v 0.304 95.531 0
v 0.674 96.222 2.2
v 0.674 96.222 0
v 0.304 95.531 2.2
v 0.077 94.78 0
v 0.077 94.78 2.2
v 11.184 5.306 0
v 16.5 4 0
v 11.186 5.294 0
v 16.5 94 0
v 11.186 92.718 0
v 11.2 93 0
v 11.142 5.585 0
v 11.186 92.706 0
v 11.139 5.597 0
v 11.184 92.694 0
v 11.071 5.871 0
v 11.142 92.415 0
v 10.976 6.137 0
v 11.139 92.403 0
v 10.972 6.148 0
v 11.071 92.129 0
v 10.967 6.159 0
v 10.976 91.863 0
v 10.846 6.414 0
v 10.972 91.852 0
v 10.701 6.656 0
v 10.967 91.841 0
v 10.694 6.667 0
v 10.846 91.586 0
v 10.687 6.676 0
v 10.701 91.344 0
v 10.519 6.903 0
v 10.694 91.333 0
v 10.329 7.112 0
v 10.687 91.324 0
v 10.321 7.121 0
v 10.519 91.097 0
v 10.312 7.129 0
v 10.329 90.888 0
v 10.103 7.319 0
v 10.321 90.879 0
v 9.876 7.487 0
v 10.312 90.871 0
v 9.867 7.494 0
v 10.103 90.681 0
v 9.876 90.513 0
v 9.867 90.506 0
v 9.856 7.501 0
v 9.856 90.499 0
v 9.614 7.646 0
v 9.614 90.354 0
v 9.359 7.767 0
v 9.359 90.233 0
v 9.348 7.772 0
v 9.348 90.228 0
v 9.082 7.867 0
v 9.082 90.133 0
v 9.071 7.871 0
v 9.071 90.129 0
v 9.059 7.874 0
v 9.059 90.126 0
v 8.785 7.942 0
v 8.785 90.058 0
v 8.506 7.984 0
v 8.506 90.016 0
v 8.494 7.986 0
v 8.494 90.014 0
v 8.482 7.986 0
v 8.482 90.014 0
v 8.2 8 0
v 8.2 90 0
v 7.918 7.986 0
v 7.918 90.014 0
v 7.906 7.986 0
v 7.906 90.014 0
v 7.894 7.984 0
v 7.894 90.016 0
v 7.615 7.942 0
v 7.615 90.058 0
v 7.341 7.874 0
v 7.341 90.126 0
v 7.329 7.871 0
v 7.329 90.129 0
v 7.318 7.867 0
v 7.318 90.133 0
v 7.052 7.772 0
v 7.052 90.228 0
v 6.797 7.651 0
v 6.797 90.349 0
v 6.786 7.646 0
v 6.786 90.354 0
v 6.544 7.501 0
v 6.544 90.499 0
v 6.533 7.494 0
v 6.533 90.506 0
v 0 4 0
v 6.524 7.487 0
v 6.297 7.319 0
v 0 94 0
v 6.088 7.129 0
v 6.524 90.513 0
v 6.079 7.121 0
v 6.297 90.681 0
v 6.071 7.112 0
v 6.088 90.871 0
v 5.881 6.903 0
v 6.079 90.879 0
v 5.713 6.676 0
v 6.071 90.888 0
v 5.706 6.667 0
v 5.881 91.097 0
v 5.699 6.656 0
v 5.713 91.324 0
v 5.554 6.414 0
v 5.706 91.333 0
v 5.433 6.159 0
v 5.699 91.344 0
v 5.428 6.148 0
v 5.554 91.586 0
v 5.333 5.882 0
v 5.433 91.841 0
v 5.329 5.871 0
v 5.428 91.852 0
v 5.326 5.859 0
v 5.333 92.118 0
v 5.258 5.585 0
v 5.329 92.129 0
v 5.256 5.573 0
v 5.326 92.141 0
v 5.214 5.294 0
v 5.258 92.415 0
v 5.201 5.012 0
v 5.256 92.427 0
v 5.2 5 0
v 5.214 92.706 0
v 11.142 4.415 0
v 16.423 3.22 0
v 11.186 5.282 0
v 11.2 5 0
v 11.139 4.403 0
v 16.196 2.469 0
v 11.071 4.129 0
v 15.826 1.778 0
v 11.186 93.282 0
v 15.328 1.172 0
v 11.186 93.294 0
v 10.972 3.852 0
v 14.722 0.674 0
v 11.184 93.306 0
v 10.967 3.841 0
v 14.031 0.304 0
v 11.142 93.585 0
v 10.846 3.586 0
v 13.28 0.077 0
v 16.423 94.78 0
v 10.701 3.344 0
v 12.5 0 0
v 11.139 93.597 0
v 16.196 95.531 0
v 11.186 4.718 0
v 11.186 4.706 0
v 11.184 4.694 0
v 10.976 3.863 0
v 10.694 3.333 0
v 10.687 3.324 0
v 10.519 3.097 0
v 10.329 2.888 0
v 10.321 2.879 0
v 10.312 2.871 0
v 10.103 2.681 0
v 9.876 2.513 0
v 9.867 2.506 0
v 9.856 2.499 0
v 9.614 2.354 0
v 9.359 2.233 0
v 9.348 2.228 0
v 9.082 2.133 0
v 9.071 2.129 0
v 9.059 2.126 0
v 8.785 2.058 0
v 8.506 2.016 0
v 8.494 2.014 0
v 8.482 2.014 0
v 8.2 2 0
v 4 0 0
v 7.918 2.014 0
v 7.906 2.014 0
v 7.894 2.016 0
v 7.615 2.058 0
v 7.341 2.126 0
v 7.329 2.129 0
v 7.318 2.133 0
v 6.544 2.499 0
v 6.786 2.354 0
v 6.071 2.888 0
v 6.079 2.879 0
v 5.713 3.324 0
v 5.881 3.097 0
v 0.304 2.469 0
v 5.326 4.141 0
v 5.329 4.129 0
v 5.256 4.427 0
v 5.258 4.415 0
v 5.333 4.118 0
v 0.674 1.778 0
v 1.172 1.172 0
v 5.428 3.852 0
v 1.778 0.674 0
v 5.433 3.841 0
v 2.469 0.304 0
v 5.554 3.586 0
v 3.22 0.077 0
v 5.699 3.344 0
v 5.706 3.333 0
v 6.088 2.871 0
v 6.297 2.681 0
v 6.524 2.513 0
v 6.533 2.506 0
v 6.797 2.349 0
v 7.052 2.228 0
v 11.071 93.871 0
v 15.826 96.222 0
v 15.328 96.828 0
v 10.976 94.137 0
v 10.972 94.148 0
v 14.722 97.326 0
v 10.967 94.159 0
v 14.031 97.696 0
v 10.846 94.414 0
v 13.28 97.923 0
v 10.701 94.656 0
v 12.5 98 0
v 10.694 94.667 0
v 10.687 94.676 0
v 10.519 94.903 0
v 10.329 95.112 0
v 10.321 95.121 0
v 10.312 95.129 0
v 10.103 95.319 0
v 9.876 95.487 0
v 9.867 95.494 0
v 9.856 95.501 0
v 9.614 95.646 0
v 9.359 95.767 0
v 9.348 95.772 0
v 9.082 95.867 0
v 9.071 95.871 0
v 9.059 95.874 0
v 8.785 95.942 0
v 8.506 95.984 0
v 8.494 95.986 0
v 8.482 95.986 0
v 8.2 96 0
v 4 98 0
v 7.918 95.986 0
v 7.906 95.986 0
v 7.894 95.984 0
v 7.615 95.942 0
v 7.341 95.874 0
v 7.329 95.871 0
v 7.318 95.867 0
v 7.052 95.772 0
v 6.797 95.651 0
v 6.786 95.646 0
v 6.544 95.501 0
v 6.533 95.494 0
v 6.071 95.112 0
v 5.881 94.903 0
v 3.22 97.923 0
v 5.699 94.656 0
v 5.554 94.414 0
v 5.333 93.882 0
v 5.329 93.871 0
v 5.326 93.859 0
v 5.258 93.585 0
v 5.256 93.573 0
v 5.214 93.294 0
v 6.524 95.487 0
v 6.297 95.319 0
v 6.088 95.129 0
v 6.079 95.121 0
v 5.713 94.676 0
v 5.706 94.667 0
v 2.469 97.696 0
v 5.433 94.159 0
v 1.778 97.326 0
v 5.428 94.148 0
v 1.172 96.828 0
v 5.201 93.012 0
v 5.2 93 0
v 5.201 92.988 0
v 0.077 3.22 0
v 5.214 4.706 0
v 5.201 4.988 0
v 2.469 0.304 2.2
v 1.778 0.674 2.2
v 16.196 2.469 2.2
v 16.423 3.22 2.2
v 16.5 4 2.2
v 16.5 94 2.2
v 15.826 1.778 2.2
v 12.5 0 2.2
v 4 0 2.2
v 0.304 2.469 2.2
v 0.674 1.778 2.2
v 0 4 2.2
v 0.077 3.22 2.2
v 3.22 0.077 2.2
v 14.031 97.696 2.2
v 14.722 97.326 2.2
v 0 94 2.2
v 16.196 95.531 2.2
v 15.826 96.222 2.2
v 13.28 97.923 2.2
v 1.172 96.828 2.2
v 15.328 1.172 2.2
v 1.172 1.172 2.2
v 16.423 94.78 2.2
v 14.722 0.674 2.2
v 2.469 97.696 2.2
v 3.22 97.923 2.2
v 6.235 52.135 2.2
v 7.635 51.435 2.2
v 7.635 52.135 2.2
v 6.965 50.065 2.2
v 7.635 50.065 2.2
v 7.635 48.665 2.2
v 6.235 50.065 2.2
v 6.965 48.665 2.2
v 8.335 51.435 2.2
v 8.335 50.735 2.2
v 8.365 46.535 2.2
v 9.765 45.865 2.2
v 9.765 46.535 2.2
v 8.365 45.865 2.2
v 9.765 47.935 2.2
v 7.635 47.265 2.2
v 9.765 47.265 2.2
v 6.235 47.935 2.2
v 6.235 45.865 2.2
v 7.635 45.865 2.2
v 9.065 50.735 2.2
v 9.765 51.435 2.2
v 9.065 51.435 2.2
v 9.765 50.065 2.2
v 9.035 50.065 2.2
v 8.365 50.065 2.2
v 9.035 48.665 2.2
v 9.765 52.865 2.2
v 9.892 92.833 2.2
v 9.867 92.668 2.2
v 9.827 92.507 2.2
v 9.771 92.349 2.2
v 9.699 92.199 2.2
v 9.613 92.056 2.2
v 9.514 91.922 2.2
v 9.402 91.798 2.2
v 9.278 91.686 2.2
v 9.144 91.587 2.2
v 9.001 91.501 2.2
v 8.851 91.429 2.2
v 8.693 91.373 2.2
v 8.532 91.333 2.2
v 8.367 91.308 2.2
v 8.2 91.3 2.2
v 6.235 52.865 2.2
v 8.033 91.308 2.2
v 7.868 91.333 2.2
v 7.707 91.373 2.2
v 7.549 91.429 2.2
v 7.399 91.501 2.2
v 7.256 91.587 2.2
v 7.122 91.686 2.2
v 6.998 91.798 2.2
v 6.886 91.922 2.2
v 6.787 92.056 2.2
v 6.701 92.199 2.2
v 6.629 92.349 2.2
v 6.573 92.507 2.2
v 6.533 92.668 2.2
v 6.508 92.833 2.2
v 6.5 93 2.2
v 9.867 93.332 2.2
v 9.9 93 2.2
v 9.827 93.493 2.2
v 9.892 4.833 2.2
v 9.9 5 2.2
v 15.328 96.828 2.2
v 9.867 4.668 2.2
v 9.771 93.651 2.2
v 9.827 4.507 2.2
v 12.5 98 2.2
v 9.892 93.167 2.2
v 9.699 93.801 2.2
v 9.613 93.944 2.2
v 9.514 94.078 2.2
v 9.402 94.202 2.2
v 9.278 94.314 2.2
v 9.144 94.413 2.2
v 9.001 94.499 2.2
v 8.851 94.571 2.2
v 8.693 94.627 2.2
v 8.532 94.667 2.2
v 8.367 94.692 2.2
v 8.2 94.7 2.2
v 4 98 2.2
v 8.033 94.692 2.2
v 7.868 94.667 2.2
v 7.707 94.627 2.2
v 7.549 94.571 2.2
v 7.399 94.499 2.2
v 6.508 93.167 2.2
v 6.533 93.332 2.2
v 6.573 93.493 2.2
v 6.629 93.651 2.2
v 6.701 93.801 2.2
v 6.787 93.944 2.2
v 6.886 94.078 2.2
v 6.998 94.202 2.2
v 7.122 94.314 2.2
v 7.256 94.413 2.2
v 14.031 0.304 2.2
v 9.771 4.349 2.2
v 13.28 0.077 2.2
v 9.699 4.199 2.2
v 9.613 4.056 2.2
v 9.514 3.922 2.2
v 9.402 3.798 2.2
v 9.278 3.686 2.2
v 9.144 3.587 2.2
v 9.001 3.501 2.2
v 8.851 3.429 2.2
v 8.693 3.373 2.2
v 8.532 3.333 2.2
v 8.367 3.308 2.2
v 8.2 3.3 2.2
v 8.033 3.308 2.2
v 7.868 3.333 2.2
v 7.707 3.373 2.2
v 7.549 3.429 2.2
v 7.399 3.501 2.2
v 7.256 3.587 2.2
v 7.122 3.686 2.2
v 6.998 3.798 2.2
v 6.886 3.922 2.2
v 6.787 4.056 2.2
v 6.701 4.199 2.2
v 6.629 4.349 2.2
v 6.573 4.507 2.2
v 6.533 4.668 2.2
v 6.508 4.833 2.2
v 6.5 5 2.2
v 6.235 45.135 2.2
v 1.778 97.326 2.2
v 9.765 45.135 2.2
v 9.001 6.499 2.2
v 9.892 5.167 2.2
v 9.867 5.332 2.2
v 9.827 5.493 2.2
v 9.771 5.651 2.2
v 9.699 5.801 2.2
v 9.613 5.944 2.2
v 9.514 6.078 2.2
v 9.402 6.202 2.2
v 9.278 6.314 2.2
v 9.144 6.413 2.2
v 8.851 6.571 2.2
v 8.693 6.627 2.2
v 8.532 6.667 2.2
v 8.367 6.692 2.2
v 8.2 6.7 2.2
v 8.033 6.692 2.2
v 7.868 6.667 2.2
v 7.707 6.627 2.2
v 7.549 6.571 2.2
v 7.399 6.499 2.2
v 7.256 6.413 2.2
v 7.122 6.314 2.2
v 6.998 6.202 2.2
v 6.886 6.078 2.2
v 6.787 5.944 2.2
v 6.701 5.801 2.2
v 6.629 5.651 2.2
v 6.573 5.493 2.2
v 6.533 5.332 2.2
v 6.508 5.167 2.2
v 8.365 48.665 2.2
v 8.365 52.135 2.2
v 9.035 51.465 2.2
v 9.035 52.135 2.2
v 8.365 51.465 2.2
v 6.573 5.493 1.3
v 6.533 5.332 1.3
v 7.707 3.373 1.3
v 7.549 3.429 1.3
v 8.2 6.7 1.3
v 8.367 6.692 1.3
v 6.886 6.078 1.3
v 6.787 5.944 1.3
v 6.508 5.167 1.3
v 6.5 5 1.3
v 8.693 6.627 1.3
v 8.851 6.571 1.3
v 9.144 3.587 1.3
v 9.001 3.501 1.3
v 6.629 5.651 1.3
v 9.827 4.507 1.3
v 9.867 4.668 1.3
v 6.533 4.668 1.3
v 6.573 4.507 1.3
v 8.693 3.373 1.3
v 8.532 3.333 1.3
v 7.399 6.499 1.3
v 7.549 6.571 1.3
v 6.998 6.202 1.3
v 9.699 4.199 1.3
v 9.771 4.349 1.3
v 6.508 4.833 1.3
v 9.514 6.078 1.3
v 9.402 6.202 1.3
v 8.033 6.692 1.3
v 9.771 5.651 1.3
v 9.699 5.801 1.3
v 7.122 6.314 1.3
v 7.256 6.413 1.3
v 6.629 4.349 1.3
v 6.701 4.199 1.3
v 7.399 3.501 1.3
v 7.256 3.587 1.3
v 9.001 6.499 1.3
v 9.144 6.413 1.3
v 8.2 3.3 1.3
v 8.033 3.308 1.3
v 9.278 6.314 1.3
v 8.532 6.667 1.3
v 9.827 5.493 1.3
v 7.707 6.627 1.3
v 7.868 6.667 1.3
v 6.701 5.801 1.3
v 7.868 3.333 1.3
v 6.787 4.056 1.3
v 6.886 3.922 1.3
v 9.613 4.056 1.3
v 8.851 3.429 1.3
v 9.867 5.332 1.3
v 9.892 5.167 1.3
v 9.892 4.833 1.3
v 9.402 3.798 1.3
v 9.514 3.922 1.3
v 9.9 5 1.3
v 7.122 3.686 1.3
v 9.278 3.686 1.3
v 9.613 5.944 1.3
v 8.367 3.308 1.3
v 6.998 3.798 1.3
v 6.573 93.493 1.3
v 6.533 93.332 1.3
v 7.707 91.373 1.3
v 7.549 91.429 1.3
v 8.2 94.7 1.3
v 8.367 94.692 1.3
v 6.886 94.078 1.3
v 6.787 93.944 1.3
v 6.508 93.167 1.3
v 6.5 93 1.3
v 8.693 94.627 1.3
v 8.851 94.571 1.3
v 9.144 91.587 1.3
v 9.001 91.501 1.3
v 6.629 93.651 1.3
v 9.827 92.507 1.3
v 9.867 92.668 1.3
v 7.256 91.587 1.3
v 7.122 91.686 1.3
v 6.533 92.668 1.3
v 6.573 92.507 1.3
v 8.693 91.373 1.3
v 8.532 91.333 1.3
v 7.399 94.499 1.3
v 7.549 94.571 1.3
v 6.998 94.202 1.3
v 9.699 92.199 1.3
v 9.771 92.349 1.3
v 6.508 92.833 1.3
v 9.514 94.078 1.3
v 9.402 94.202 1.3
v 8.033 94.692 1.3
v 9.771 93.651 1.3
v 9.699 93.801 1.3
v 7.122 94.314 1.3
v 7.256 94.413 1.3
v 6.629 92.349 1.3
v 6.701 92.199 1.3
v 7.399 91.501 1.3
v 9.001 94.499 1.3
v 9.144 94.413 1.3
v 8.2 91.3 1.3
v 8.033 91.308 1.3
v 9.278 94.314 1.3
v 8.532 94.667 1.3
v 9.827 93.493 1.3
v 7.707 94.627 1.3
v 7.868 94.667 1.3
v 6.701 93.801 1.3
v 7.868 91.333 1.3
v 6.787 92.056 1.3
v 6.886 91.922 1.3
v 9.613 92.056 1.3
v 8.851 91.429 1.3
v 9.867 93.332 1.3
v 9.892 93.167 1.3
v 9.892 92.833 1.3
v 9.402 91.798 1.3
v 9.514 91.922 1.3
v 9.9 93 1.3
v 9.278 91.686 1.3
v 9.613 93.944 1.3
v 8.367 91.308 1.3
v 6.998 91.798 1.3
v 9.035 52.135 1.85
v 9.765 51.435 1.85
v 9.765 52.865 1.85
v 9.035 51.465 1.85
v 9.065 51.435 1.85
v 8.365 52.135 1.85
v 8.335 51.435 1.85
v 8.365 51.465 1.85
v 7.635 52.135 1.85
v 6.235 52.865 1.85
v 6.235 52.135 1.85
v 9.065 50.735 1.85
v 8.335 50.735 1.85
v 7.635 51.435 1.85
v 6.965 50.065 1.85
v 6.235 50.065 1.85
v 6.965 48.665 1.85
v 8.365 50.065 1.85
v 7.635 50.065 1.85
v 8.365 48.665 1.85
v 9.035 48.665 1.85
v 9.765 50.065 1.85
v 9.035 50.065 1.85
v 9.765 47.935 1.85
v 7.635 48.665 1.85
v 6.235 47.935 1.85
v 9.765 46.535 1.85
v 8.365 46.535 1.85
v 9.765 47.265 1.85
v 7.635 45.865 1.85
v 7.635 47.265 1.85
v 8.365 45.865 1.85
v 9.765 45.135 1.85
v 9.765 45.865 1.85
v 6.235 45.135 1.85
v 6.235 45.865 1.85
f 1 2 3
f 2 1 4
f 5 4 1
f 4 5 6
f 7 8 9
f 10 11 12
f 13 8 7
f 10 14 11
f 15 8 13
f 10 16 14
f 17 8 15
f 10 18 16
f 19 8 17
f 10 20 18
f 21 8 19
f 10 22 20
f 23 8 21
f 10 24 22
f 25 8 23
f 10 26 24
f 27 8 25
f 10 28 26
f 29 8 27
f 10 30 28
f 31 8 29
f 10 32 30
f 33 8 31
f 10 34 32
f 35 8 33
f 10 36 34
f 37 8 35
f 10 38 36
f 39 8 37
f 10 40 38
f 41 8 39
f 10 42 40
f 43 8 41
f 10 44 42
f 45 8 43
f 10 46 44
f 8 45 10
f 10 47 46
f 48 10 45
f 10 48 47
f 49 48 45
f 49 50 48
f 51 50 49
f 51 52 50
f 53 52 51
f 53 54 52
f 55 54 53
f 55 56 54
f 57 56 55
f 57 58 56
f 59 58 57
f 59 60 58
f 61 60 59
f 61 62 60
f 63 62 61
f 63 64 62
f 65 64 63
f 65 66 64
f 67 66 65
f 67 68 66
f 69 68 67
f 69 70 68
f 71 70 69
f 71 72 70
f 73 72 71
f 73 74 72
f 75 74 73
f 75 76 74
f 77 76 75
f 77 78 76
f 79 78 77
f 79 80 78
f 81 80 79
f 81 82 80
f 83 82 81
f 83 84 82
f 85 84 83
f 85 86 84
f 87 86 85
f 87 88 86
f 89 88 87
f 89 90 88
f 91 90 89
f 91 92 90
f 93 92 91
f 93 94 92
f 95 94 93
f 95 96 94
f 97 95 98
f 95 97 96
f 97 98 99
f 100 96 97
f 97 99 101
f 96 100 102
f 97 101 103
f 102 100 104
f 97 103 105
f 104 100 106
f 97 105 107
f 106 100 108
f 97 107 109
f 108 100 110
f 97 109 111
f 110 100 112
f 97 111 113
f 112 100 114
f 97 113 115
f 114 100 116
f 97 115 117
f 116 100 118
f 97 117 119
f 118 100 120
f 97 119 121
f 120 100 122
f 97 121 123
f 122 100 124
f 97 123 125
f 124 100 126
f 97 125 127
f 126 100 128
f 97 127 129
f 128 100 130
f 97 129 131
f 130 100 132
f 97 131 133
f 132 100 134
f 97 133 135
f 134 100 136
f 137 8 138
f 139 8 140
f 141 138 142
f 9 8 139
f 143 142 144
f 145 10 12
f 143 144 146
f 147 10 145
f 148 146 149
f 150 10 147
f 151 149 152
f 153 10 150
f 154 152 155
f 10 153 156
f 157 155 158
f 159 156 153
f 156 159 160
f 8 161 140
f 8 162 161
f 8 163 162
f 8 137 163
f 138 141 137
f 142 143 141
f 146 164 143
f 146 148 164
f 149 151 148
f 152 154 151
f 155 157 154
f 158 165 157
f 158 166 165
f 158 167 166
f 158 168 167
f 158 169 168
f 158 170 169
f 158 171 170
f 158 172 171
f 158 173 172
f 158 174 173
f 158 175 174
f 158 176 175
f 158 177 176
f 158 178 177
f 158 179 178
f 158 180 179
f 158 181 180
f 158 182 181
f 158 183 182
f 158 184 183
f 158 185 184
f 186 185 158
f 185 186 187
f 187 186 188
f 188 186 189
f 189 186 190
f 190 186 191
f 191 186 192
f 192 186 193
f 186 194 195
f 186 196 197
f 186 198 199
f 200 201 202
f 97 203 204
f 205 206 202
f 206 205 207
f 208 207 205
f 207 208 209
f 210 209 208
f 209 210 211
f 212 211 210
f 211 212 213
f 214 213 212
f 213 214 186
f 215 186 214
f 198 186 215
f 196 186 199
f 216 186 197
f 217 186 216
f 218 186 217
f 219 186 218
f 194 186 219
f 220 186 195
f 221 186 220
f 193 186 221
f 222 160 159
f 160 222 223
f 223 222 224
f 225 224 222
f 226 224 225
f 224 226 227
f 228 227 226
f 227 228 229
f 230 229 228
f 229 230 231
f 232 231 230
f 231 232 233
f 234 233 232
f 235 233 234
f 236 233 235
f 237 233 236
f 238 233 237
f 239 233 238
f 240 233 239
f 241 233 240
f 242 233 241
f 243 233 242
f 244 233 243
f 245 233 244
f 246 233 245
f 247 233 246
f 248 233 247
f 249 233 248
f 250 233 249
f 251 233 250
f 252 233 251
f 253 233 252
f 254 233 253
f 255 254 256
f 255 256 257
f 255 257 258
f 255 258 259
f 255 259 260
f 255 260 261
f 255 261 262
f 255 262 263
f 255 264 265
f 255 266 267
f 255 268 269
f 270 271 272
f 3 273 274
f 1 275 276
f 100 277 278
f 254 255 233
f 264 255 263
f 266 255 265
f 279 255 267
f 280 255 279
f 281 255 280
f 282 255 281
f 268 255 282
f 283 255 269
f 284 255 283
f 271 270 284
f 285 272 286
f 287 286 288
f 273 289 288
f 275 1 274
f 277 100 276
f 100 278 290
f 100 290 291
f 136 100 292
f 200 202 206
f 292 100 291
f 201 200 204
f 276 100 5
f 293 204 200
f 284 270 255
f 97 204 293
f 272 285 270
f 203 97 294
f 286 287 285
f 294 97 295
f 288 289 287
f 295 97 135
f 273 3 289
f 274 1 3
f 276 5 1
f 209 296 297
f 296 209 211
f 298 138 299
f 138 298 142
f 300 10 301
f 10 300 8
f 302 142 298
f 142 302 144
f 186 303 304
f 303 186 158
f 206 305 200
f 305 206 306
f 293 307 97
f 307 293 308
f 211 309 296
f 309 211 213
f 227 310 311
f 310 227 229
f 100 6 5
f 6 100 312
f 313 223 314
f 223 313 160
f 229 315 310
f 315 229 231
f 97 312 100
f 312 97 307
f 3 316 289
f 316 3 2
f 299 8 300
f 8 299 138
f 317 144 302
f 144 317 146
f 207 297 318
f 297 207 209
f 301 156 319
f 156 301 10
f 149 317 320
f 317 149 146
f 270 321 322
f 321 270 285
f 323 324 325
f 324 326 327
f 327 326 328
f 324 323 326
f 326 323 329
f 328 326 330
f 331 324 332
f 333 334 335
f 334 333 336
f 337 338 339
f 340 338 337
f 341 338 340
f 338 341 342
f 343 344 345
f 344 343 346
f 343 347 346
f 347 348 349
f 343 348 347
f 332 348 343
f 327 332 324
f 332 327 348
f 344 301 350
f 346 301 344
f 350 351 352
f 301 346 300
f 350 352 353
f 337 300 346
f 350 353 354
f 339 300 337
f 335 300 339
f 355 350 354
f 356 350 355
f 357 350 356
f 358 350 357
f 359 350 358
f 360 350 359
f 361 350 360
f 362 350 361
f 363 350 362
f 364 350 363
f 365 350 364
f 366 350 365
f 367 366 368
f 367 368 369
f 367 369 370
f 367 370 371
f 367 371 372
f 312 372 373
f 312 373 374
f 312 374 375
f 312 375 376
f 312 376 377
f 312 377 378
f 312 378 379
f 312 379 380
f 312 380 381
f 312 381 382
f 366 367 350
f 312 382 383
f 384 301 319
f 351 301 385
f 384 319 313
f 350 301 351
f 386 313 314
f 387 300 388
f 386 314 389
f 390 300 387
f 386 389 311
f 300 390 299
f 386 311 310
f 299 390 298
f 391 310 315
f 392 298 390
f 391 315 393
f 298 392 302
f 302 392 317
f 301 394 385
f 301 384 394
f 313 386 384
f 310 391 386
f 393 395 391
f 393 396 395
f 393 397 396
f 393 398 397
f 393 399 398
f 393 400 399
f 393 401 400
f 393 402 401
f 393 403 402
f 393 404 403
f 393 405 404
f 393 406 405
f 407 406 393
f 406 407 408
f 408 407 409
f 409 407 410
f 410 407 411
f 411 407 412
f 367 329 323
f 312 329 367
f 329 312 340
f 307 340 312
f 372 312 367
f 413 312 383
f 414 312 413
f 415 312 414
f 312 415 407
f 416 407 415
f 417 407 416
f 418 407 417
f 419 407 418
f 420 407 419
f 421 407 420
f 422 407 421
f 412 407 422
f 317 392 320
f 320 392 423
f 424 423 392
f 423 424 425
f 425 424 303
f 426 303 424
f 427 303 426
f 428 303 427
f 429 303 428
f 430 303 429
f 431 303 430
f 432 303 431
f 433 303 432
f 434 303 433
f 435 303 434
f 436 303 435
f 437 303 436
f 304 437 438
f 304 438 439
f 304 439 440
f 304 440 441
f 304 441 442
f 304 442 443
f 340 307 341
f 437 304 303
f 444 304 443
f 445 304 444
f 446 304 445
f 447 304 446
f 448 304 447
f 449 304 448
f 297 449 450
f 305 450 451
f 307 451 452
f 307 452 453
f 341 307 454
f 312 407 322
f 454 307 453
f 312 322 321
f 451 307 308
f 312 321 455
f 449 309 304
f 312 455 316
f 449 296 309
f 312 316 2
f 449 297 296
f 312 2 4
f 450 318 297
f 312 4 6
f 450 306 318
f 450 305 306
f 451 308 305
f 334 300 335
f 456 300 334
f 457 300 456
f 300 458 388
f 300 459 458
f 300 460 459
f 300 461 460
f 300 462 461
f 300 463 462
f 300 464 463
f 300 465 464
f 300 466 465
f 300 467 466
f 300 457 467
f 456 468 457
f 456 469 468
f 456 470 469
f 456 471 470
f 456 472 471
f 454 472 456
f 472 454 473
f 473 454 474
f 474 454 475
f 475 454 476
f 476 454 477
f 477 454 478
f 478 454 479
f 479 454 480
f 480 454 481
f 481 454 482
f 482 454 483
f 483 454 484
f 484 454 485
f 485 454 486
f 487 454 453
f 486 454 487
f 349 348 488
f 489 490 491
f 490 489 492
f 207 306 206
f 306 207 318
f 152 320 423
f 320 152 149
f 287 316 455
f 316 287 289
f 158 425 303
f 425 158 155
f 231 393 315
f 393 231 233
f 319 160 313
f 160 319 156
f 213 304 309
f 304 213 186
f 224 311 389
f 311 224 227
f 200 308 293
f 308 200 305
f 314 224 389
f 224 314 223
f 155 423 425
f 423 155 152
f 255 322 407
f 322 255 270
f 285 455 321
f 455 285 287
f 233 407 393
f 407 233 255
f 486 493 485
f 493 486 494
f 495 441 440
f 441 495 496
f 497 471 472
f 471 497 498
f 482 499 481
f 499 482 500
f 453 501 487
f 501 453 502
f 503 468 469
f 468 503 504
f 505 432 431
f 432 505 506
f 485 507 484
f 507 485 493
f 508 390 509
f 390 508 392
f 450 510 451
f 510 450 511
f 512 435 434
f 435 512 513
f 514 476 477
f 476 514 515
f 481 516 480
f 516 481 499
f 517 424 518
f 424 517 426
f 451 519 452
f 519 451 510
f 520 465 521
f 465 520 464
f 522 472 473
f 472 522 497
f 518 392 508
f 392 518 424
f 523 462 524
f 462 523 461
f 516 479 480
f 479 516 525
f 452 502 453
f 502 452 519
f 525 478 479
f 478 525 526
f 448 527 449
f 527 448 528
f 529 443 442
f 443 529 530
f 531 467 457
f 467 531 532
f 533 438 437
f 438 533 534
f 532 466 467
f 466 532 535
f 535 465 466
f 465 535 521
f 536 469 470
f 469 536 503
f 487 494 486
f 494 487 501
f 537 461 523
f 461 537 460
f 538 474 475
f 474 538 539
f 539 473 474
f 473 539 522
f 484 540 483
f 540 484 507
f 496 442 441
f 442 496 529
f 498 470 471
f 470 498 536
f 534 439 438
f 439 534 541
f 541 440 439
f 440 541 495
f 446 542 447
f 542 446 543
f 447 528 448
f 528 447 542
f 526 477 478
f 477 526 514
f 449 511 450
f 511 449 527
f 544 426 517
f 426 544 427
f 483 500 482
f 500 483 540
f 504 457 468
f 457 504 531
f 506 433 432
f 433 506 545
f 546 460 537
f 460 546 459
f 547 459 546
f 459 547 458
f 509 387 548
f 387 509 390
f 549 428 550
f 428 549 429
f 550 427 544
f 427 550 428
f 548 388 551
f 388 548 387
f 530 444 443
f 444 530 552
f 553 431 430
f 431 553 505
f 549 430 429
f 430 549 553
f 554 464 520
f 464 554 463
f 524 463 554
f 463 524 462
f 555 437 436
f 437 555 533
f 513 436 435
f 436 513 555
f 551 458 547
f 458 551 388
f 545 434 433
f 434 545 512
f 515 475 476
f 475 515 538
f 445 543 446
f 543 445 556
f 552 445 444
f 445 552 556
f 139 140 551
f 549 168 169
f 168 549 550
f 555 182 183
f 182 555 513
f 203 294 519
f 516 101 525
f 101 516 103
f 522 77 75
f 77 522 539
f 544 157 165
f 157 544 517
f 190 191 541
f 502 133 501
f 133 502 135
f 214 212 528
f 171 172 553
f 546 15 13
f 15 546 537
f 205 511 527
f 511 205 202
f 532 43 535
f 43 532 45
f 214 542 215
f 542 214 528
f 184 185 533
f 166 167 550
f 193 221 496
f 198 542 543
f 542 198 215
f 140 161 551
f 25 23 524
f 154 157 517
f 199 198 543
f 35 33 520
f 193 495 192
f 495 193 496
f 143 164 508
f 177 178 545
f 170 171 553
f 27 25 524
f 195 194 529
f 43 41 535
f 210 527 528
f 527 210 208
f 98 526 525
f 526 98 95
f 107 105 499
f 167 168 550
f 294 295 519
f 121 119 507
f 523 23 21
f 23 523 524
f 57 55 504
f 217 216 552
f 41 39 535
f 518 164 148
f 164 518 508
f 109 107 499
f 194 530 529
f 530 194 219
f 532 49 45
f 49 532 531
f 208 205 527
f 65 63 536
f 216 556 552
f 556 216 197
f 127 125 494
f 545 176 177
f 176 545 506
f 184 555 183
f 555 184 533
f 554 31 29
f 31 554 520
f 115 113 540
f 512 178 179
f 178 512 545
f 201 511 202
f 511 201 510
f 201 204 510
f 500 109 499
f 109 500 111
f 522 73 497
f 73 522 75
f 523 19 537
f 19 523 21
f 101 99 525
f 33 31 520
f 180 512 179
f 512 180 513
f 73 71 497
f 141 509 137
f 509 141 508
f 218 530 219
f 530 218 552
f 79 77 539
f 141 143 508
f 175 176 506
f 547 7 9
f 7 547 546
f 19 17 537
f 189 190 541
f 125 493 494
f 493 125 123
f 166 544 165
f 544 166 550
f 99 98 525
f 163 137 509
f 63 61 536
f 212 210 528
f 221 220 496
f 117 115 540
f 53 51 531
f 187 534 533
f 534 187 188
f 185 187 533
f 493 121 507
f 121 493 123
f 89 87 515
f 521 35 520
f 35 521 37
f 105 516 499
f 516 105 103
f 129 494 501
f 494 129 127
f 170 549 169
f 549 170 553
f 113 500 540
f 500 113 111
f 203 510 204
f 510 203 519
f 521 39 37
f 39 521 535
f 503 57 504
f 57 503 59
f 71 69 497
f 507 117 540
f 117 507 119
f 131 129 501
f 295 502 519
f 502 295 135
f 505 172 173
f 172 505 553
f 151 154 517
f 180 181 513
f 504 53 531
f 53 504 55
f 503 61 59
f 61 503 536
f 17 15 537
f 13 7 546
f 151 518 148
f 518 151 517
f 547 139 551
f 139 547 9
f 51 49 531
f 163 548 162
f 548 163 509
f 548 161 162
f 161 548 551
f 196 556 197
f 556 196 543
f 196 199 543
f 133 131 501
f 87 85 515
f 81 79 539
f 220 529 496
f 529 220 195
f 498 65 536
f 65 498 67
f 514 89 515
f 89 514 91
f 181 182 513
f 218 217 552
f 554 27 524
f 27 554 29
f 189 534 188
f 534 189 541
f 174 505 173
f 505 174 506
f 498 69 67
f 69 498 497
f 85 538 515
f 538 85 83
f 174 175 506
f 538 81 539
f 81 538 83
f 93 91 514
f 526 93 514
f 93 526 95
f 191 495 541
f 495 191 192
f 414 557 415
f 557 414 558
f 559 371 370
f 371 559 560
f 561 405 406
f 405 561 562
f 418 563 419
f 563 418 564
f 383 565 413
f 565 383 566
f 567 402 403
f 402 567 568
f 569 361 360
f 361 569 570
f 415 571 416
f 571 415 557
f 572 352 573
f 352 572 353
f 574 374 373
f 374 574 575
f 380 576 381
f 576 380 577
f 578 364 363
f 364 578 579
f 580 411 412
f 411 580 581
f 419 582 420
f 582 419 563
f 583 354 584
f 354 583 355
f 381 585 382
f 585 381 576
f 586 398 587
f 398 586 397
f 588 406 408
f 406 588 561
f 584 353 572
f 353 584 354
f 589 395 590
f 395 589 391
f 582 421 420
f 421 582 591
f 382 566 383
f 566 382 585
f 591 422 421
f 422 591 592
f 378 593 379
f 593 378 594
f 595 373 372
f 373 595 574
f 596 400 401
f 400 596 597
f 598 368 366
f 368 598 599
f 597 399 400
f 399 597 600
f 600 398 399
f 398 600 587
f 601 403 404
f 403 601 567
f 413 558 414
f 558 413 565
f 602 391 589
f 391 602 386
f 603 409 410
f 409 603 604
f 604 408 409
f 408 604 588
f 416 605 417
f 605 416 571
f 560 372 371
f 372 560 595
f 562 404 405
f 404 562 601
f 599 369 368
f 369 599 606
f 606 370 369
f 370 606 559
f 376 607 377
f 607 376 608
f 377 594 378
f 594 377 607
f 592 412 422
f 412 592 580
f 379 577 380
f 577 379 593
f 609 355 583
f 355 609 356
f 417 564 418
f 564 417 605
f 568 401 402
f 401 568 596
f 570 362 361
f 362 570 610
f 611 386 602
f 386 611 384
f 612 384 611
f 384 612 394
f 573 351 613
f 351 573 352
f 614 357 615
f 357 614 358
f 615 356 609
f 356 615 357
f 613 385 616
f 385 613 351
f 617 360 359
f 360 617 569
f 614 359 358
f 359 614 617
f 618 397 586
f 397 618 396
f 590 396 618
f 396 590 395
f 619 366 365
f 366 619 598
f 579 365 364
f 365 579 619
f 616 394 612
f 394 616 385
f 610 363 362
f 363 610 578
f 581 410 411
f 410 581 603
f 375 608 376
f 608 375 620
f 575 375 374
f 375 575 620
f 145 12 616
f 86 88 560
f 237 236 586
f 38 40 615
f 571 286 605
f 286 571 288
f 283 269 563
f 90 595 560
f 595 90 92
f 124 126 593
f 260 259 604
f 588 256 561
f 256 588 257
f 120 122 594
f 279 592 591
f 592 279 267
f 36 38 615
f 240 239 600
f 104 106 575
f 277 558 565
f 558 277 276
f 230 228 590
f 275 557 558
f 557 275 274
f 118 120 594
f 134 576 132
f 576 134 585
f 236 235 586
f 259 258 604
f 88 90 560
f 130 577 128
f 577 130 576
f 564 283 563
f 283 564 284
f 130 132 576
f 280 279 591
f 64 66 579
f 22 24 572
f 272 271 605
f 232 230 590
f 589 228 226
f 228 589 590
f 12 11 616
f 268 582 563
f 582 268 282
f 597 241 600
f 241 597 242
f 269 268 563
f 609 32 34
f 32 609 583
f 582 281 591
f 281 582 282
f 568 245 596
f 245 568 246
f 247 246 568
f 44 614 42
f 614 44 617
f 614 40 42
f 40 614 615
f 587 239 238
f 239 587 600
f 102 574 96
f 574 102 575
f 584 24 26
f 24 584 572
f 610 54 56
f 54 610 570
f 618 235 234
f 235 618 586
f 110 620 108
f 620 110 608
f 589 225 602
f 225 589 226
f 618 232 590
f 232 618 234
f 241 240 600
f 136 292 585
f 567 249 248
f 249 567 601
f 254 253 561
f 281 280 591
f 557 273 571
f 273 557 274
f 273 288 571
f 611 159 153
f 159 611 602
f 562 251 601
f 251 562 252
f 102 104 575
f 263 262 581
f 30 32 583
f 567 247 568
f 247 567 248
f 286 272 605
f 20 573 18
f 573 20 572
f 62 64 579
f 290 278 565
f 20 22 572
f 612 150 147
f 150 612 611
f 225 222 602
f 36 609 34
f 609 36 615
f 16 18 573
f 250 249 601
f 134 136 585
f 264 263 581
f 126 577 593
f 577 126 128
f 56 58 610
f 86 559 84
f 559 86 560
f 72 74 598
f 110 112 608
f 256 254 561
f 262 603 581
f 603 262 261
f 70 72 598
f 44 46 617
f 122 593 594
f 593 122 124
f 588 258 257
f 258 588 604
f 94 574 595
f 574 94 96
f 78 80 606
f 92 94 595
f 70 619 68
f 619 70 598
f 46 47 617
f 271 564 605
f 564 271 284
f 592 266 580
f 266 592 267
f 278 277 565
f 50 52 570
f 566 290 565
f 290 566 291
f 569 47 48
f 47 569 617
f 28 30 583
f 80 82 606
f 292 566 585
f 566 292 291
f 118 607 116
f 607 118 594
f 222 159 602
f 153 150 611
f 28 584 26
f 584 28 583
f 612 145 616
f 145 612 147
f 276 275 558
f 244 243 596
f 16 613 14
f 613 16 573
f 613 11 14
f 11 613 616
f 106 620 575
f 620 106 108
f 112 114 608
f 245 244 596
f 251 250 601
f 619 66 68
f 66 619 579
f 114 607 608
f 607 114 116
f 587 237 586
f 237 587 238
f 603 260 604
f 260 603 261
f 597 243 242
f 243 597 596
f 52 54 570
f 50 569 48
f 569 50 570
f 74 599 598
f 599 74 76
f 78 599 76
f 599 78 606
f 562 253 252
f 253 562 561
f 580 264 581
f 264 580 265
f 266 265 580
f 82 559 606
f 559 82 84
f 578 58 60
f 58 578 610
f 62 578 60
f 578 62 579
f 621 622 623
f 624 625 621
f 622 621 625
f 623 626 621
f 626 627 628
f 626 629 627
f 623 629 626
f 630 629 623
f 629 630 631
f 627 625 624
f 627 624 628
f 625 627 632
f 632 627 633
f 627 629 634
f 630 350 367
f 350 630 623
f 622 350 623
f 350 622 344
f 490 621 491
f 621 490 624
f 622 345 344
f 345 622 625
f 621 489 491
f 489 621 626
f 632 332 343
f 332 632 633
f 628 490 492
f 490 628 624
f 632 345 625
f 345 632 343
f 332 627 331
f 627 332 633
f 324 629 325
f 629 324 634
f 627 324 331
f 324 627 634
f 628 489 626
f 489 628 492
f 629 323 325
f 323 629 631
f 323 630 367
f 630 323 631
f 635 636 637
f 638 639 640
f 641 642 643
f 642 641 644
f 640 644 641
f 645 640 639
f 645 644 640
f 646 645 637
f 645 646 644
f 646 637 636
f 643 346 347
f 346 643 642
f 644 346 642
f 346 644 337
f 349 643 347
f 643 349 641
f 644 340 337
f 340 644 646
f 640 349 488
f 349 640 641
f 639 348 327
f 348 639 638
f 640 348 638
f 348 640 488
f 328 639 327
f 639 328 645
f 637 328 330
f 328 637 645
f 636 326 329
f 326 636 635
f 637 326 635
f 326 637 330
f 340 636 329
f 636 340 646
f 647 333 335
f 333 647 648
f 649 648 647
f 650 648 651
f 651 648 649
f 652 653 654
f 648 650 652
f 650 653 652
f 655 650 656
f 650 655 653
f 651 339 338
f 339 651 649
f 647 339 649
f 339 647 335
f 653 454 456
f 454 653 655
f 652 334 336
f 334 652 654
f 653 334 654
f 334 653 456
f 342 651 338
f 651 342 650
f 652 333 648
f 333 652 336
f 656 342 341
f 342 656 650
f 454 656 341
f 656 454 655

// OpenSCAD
// 出牌口下飾蓋
$fn=64;
translate([-43,49,103.2]){rotate([0,90,0]){difference(){difference(){difference(){difference(){difference(){multmatrix([[0,0,1,101],[1,0,0,0],[0,1,0,0],[0,0,0,1]]){translate([0,51.25,0]){translate([0,0,0]){linear_extrude(height=2.2)polygon([[49,4.25],[48.92314,5.03036],[48.69552,5.78073],[48.32588,6.47228],[47.82843,7.07843],[47.22228,7.57588],[46.53073,7.94552],[45.78036,8.17314],[45,8.25],[-45,8.25],[-45.78036,8.17314],[-46.53073,7.94552],[-47.22228,7.57588],[-47.82843,7.07843],[-48.32588,6.47228],[-48.69552,5.78073],[-48.92314,5.03036],[-49,4.25],[-49,-4.25],[-48.92314,-5.03036],[-48.69552,-5.78073],[-48.32588,-6.47228],[-47.82843,-7.07843],[-47.22228,-7.57588],[-46.53073,-7.94552],[-45.78036,-8.17314],[-45,-8.25],[45,-8.25],[45.78036,-8.17314],[46.53073,-7.94552],[47.22228,-7.57588],[47.82843,-7.07843],[48.32588,-6.47228],[48.69552,-5.78073],[48.92314,-5.03036],[49,-4.25]]);}}}translate([99,-44,51.2]){rotate([0,90,0]){translate([0,0,0]){cylinder(h=7,d1=3.4,d2=3.4,$fn=64);}}}}translate([103.3,-44,51.2]){rotate([0,-90,0]){translate([0,0,0]){cylinder(h=1.4,d1=6.2,d2=3.4,$fn=64);}}}}translate([99,44,51.2]){rotate([0,90,0]){translate([0,0,0]){cylinder(h=7,d1=3.4,d2=3.4,$fn=64);}}}}translate([103.3,44,51.2]){rotate([0,-90,0]){translate([0,0,0]){cylinder(h=1.4,d1=6.2,d2=3.4,$fn=64);}}}}multmatrix([[0,0,-1,101],[-1,0,0,0],[0,1,0,51],[0,0,0,1]]){union(){union(){union(){union(){union(){union(){union(){union(){union(){union(){union(){union(){union(){union(){union(){union(){union(){union(){union(){union(){union(){union(){union(){union(){union(){union(){union(){translate([-3.865,1.035,-0.35]){cube([0.73,0.73,0.47]);}translate([-3.165,1.035,-0.35]){cube([0.73,0.73,0.47]);}}translate([-3.865,0.335,-0.35]){cube([0.73,0.73,0.47]);}}translate([-2.465,0.335,-0.35]){cube([0.73,0.73,0.47]);}}translate([-3.865,-0.365,-0.35]){cube([0.73,0.73,0.47]);}}translate([-3.165,-0.365,-0.35]){cube([0.73,0.73,0.47]);}}translate([-3.865,-1.065,-0.35]){cube([0.73,0.73,0.47]);}}translate([-3.865,-1.765,-0.35]){cube([0.73,0.73,0.47]);}}translate([-1.065,1.035,-0.35]){cube([0.73,0.73,0.47]);}}translate([-0.365,1.035,-0.35]){cube([0.73,0.73,0.47]);}}translate([0.335,1.035,-0.35]){cube([0.73,0.73,0.47]);}}translate([0.335,0.335,-0.35]){cube([0.73,0.73,0.47]);}}translate([-1.065,-0.365,-0.35]){cube([0.73,0.73,0.47]);}}translate([-0.365,-0.365,-0.35]){cube([0.73,0.73,0.47]);}}translate([0.335,-0.365,-0.35]){cube([0.73,0.73,0.47]);}}translate([0.335,-1.065,-0.35]){cube([0.73,0.73,0.47]);}}translate([-1.065,-1.765,-0.35]){cube([0.73,0.73,0.47]);}}translate([-0.365,-1.765,-0.35]){cube([0.73,0.73,0.47]);}}translate([0.335,-1.765,-0.35]){cube([0.73,0.73,0.47]);}}translate([1.735,1.035,-0.35]){cube([0.73,0.73,0.47]);}}translate([3.135,1.035,-0.35]){cube([0.73,0.73,0.47]);}}translate([1.735,0.335,-0.35]){cube([0.73,0.73,0.47]);}}translate([3.135,0.335,-0.35]){cube([0.73,0.73,0.47]);}}translate([1.735,-0.365,-0.35]){cube([0.73,0.73,0.47]);}}translate([2.435,-0.365,-0.35]){cube([0.73,0.73,0.47]);}}translate([3.135,-0.365,-0.35]){cube([0.73,0.73,0.47]);}}translate([3.135,-1.065,-0.35]){cube([0.73,0.73,0.47]);}}translate([3.135,-1.765,-0.35]){cube([0.73,0.73,0.47]);}}}}}}
